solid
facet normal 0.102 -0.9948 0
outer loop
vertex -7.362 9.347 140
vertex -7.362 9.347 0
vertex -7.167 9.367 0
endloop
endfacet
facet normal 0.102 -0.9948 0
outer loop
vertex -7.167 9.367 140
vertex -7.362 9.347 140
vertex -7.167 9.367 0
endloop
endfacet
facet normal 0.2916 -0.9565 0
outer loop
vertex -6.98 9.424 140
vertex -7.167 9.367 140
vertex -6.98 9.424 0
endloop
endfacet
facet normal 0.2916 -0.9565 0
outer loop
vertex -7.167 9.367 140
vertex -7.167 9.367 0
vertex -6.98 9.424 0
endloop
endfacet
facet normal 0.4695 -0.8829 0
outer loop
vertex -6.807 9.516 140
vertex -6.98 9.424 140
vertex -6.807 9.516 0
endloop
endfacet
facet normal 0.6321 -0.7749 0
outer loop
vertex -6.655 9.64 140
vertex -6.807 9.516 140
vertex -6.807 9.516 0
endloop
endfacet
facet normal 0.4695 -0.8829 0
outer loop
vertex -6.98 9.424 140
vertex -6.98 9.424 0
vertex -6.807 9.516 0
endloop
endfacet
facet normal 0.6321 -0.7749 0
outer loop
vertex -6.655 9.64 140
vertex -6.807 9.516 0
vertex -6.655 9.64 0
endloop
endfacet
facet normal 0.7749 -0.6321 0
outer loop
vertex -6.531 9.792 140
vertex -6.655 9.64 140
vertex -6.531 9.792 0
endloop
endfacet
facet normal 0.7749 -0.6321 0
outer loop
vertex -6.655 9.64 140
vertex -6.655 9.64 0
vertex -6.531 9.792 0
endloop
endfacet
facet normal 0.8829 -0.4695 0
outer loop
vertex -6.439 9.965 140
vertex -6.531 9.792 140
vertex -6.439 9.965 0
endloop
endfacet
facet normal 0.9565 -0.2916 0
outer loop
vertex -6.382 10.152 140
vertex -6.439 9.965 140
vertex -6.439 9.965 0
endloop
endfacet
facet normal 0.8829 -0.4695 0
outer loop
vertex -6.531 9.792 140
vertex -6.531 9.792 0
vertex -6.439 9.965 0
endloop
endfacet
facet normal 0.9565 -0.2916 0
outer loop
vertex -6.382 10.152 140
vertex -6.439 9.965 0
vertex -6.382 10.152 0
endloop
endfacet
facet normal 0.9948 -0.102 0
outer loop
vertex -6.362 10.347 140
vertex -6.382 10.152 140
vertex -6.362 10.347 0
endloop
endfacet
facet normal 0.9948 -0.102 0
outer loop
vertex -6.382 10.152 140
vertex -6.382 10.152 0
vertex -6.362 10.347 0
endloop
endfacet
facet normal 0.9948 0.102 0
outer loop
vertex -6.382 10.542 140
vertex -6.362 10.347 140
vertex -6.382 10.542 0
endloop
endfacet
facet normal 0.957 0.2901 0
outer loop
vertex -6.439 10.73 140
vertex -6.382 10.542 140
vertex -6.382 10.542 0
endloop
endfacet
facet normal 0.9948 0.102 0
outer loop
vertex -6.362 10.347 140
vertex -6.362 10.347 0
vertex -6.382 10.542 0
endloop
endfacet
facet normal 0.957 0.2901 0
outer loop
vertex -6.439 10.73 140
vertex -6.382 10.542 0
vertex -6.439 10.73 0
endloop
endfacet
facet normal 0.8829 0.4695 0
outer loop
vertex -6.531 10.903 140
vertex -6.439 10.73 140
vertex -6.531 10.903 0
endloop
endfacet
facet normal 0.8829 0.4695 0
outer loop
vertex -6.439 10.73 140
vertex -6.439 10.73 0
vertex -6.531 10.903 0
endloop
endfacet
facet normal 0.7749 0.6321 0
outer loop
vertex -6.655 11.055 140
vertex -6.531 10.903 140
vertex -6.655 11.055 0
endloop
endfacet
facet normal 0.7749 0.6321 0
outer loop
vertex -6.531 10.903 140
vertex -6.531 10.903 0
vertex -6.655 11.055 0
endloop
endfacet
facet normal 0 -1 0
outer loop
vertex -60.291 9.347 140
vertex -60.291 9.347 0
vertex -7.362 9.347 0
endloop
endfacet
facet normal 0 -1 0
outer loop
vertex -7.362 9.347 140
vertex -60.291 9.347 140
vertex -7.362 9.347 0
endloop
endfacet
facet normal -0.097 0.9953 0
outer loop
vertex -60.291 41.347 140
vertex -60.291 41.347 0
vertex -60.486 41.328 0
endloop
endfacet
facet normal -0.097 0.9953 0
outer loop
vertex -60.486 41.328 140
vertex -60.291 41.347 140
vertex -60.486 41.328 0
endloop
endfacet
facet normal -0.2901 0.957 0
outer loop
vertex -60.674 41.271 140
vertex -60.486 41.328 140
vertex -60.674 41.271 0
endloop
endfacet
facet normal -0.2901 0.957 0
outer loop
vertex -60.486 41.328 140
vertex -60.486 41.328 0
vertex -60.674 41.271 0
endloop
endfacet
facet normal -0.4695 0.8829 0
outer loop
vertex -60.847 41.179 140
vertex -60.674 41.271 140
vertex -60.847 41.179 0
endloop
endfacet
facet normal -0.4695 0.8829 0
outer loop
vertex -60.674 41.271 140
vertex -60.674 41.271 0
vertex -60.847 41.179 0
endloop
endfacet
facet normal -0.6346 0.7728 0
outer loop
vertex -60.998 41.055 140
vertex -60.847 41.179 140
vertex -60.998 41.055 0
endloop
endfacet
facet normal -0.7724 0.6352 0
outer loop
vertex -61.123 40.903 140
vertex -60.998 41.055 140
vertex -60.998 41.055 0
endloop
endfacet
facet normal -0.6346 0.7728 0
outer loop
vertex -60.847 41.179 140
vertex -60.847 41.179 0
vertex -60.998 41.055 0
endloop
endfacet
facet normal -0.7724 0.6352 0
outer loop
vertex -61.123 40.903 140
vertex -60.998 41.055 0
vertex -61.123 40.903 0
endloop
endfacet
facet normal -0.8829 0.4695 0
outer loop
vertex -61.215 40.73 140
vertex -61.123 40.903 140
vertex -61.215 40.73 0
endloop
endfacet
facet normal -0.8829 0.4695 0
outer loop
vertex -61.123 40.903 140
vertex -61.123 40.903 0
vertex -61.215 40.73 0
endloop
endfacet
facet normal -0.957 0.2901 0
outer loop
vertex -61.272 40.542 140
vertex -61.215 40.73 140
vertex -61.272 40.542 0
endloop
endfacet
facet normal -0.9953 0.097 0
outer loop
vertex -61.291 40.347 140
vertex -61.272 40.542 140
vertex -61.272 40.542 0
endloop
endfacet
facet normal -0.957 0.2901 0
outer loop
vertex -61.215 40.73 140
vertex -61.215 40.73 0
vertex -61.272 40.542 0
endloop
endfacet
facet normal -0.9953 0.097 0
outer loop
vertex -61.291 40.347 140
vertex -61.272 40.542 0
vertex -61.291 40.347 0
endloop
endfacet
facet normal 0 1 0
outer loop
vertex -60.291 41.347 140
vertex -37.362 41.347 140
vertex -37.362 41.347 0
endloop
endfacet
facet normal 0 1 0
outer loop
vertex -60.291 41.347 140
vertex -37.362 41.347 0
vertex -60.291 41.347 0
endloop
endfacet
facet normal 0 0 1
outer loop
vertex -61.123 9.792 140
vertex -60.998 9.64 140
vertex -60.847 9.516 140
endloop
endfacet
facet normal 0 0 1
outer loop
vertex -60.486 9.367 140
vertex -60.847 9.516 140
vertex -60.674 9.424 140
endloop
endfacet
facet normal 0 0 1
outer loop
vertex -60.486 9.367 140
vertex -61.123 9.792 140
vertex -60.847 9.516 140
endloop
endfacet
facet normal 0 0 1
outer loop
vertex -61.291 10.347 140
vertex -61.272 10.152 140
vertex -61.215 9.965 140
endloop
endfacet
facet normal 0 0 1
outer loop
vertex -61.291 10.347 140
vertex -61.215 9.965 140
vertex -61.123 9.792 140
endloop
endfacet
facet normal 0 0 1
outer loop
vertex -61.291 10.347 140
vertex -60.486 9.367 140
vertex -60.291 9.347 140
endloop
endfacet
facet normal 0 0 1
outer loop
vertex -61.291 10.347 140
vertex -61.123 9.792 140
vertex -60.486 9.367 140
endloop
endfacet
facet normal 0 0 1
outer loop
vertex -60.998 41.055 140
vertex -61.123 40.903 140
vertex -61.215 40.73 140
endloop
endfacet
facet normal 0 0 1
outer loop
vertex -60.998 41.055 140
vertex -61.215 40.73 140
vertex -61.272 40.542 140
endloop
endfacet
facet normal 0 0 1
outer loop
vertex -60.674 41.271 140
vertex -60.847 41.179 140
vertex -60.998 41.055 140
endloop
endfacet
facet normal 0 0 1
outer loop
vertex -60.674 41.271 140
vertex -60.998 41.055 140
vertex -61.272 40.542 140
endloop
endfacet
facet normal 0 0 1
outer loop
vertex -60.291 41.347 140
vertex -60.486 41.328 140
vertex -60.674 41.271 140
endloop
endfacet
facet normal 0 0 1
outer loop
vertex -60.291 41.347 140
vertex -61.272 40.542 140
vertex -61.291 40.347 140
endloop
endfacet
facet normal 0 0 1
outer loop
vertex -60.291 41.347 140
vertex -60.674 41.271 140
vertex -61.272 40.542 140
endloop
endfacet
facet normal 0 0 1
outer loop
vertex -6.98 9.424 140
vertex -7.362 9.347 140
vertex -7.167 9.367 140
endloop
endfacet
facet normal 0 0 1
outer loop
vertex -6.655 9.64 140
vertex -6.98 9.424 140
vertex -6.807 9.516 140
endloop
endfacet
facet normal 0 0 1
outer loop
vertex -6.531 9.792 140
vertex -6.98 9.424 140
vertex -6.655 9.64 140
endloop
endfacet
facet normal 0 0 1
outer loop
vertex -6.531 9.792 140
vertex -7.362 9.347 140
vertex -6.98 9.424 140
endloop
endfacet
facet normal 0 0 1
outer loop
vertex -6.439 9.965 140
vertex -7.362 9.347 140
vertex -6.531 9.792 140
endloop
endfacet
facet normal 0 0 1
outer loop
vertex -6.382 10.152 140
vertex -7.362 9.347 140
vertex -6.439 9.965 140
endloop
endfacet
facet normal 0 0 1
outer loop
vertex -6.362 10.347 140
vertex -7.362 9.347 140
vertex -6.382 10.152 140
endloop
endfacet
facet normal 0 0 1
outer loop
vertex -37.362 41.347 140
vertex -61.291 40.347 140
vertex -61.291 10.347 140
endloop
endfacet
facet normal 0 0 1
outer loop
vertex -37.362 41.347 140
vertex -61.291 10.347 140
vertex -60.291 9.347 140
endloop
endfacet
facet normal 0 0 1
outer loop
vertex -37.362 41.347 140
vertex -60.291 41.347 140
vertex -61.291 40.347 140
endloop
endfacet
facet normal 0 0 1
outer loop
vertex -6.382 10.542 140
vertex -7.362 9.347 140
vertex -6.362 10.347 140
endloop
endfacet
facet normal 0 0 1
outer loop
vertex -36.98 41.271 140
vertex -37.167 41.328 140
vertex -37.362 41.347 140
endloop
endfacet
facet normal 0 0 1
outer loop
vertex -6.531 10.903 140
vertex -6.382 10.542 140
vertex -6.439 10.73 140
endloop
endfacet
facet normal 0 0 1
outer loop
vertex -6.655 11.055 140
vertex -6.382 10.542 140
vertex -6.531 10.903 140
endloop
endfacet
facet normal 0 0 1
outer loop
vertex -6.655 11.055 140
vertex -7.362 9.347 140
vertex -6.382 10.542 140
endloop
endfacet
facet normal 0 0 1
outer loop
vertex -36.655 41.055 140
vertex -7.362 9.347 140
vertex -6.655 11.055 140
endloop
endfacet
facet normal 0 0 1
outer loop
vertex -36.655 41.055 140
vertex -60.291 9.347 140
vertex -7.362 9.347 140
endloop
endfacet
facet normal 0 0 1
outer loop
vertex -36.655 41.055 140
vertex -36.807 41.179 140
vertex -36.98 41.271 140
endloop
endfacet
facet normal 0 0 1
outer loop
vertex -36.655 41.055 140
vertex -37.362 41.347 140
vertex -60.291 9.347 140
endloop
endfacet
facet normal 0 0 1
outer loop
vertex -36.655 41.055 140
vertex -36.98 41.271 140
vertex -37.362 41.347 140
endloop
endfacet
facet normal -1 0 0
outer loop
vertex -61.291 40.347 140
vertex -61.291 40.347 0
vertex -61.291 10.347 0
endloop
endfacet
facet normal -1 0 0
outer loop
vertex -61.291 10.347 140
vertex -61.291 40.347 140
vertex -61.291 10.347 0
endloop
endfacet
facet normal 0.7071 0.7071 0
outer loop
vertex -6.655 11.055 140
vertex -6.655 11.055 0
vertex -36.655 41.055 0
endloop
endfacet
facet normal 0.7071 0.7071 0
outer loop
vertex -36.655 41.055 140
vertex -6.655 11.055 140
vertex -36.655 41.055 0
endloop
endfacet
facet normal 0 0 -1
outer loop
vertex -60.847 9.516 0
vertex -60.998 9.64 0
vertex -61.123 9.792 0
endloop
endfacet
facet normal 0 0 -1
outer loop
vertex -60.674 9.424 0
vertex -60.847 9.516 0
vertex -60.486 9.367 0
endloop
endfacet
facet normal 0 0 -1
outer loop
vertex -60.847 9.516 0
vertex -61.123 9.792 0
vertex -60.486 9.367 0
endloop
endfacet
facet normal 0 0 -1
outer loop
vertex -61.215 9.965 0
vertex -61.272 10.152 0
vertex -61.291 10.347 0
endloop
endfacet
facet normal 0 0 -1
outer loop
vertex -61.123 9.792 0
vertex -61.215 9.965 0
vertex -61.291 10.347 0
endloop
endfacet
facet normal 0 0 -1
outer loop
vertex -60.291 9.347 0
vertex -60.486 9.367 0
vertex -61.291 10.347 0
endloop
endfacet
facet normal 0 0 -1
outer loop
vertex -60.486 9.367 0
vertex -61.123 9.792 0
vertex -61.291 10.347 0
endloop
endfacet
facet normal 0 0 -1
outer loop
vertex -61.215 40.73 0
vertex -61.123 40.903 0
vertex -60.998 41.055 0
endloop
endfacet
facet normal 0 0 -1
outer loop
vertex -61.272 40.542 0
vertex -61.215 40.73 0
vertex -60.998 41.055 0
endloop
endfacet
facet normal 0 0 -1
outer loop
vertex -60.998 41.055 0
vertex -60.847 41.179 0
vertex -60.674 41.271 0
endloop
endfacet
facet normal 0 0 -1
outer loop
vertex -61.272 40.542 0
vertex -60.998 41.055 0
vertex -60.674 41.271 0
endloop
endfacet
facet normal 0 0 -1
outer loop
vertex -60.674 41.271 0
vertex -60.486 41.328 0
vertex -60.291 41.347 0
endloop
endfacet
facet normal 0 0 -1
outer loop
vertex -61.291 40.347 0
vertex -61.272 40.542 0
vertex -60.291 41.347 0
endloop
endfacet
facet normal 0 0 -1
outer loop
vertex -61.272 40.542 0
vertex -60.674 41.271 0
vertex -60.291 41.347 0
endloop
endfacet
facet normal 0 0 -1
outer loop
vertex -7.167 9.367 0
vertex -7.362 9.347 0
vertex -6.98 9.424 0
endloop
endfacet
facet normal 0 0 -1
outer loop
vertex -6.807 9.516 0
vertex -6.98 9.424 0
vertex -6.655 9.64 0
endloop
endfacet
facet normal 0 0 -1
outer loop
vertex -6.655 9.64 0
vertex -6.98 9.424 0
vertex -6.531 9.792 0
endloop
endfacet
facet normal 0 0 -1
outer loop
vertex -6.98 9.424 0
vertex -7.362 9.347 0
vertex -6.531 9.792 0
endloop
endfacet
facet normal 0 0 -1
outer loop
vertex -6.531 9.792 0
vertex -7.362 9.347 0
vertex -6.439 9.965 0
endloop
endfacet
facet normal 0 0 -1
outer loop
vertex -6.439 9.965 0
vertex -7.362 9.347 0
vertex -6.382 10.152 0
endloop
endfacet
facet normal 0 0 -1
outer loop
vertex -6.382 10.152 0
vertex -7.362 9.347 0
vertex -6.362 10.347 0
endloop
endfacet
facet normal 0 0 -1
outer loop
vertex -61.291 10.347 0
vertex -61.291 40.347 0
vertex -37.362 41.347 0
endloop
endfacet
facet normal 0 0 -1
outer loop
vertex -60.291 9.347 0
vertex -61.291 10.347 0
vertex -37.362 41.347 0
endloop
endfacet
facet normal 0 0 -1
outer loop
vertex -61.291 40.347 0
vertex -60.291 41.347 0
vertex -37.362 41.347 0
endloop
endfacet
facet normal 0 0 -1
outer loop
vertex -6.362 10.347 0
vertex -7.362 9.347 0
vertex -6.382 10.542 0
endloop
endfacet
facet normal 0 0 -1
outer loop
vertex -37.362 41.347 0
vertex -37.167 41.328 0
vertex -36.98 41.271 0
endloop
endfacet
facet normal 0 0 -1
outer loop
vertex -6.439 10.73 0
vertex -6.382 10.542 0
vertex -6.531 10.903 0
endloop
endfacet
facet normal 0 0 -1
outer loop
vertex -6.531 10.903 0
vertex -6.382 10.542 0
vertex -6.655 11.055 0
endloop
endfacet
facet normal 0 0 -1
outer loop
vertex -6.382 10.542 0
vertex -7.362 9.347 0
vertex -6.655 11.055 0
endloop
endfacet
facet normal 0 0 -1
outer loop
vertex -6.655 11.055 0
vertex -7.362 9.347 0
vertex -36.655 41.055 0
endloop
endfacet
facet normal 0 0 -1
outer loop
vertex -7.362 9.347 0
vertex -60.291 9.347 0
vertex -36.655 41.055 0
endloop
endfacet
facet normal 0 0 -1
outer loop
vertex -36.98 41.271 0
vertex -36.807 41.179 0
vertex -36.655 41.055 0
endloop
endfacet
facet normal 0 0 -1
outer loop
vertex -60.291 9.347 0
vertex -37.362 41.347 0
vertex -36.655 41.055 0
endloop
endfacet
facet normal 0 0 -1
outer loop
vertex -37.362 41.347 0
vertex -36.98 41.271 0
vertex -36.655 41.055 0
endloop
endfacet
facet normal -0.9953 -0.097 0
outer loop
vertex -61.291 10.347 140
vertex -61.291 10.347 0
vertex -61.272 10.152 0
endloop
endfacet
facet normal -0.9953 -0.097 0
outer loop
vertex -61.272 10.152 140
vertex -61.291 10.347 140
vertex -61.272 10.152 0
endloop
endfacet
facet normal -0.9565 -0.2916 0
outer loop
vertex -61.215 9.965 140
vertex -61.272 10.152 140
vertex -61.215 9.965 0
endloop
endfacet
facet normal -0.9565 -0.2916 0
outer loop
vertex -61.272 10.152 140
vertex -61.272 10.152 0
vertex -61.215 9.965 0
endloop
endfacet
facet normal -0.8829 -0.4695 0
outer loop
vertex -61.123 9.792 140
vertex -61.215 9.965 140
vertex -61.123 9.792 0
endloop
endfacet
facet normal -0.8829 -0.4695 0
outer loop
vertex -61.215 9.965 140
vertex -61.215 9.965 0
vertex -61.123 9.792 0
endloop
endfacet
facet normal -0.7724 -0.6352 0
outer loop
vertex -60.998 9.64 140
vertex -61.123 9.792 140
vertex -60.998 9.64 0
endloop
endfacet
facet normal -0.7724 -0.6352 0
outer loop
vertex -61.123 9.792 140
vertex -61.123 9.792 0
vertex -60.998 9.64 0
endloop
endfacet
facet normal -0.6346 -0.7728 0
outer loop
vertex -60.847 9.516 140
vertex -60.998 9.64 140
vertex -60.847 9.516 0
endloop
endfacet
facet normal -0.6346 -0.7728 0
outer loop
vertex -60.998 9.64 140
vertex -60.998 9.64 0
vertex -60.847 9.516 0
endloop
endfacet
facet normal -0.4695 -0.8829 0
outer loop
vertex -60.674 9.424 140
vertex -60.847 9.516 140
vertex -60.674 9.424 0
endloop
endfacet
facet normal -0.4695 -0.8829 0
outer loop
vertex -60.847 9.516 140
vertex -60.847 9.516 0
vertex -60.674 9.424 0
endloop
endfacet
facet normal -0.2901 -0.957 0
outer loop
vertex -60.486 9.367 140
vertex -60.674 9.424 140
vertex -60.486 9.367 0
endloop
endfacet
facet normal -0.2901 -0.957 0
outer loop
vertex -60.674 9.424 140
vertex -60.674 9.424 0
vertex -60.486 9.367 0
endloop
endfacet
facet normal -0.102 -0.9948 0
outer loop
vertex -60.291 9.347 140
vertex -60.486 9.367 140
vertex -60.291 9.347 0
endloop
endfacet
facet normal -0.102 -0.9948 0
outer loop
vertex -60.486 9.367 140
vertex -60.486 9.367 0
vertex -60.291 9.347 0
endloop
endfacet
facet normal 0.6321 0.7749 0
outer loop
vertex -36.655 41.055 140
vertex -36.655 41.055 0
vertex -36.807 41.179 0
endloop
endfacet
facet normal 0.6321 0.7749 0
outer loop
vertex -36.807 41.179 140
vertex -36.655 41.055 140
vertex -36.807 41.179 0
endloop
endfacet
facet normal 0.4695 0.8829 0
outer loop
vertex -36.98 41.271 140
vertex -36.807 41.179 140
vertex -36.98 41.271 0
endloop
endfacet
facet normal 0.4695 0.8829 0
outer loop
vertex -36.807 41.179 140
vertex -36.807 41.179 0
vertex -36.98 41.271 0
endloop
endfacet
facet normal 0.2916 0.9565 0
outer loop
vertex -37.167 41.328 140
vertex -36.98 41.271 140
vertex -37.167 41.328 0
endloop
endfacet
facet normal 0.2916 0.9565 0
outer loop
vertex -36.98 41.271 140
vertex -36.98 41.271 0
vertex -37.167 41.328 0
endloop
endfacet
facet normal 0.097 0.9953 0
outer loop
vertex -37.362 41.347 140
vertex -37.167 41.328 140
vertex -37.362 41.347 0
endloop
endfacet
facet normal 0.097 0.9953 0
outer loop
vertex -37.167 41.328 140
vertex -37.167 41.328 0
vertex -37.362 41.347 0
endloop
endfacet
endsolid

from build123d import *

# Parameters (mm, degrees)
F1_DEPTH = 150
F3_DEPTH = 140


with BuildPart() as f1:
    # F0 (on Top) → F1 (new body)
    with BuildSketch(Plane.XY):
        with BuildLine():
            Line((-35.705528, 49.347393), (-67.291312, 49.347393))
            ThreePointArc((-67.291312, 49.347393), (-68.705525, 48.761607), (-69.291312, 47.347393))
            Line((-69.291312, 47.347393), (-69.291312, 3.347397))
            ThreePointArc((-69.291312, 3.347397), (-68.705525, 1.933183), (-67.291312, 1.347397))
            Line((-67.291312, 1.347397), (9.537109, 1.347397))
            ThreePointArc((9.537109, 1.347397), (11.384868, 2.58203), (10.951323, 4.76161))
            Line((10.951323, 4.76161), (-32.169994, 47.882927))
            ThreePointArc((-32.169994, 47.882927), (-33.792111, 48.966791), (-35.705528, 49.347393))
        make_face()
        with BuildLine():
            ThreePointArc((-65.291314, 44.347395), (-64.99842, 45.054502), (-64.291314, 45.347395))
            Line((-64.291314, 45.347395), (-36.119741, 45.347395))
            ThreePointArc((-36.119741, 45.347395), (-35.354374, 45.195154), (-34.705527, 44.761609))
            Line((-34.705527, 44.761609), (3.00158, 7.054502))
            ThreePointArc((3.00158, 7.054502), (3.218352, 5.964712), (2.294473, 5.347395))
            Line((2.294473, 5.347395), (-64.291314, 5.347395))
            ThreePointArc((-64.291314, 5.347395), (-64.99842, 5.640288), (-65.291314, 6.347395))
            Line((-65.291314, 6.347395), (-65.291314, 44.347395))
        make_face(mode=Mode.SUBTRACT)
    extrude(amount=F1_DEPTH)


with BuildPart() as f3:
    # F2 (on Top) → F3 (new body)
    with BuildSketch(Plane.XY):
        with BuildLine():
            Line((-37.362381, 41.347396), (-60.291314, 41.347396))
            ThreePointArc((-60.291314, 41.347396), (-60.998421, 41.054502), (-61.291314, 40.347396))
            Line((-61.291314, 40.347396), (-61.291314, 10.347394))
            ThreePointArc((-61.291314, 10.347394), (-60.998421, 9.640288), (-60.291314, 9.347394))
            Line((-60.291314, 9.347394), (-7.36238, 9.347394))
            ThreePointArc((-7.36238, 9.347394), (-6.4385, 9.964711), (-6.655273, 11.054501))
            Line((-6.655273, 11.054501), (-36.655274, 41.054502))
            ThreePointArc((-36.655274, 41.054502), (-36.979698, 41.271275), (-37.362381, 41.347396))
        make_face()
    extrude(amount=F3_DEPTH)


solid = f3.part
